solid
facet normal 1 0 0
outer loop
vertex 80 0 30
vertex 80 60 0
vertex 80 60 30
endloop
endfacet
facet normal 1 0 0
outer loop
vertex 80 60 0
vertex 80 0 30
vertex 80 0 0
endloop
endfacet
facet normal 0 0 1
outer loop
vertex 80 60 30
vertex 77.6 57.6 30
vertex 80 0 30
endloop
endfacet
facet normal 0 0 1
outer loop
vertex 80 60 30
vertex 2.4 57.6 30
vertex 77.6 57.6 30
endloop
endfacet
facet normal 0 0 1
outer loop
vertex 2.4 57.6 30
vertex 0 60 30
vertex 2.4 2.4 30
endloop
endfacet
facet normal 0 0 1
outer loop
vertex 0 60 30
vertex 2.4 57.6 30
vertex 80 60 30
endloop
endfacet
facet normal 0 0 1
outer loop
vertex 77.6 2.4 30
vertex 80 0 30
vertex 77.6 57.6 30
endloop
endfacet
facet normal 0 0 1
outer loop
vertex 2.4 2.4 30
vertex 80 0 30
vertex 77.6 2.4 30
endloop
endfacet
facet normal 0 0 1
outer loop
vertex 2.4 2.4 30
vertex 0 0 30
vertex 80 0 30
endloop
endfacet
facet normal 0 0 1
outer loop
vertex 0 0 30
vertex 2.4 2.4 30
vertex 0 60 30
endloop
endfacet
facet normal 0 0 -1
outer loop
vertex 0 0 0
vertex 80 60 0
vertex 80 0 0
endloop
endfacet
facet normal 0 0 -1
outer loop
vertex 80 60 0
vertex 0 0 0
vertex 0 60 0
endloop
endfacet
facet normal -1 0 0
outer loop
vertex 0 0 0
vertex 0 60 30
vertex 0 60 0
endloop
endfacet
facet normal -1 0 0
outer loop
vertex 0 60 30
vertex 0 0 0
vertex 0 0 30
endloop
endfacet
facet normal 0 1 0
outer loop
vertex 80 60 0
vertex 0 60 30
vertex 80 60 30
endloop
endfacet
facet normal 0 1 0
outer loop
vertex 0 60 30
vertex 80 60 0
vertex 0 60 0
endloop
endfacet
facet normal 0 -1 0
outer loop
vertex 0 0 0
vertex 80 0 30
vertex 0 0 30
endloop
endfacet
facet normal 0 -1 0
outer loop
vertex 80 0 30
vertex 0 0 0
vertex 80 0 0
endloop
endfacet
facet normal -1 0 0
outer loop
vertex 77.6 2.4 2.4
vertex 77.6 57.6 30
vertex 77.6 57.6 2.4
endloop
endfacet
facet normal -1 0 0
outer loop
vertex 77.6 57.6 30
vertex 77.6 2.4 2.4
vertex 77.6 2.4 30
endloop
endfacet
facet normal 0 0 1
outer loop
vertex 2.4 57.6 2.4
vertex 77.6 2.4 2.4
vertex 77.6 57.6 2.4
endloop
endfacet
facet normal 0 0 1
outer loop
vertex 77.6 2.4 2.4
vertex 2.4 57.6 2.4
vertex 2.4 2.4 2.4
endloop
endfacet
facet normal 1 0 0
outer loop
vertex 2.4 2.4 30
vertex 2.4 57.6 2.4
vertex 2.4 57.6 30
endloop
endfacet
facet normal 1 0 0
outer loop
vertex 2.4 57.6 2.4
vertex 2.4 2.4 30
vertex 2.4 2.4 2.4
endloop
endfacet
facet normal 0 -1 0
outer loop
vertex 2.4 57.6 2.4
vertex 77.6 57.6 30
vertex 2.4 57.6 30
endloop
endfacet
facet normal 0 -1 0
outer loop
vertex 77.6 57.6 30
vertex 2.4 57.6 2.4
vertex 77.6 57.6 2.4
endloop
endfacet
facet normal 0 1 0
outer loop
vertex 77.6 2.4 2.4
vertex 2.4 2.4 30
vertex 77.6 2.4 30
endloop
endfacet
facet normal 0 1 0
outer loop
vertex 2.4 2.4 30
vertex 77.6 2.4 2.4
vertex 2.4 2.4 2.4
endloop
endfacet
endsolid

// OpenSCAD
// file: lib/scale_overlay.scad
module scale_overlay(length = 100, major_step = 10, tick_height = 2, tick_width = 0.8, base_height = 0.4) {
    color([0.1, 0.1, 0.1])
        cube([length, tick_width, base_height]);

    for (x = [0:major_step:length]) {
        color([0.1, 0.1, 0.1])
            translate([x, 0, 0])
                cube([tick_width, tick_width, tick_height]);
    }
}
// main file
// Simple parametric open-top box for CLI render/export testing.

include <lib/scale_overlay.scad>;

width = 80;
depth = 60;
height = 30;
wall_thickness = 2.4;
floor_thickness = 2.4;
show_scale = false;

module box_model(
    width = 80,
    depth = 60,
    height = 30,
    wall_thickness = 2.4,
    floor_thickness = 2.4
) {
    inner_width = width - (2 * wall_thickness);
    inner_depth = depth - (2 * wall_thickness);
    inner_height = height - floor_thickness;

    difference() {
        cube([width, depth, height]);
        translate([wall_thickness, wall_thickness, floor_thickness])
            cube([inner_width, inner_depth, inner_height]);
    }
}

box_model(
    width = width,
    depth = depth,
    height = height,
    wall_thickness = wall_thickness,
    floor_thickness = floor_thickness
);

if (show_scale) {
    // Place ruler near front-left corner for visual size reference in previews.
    translate([-10, -8, 0])
        scale_overlay(length = 100, major_step = 10);
}
